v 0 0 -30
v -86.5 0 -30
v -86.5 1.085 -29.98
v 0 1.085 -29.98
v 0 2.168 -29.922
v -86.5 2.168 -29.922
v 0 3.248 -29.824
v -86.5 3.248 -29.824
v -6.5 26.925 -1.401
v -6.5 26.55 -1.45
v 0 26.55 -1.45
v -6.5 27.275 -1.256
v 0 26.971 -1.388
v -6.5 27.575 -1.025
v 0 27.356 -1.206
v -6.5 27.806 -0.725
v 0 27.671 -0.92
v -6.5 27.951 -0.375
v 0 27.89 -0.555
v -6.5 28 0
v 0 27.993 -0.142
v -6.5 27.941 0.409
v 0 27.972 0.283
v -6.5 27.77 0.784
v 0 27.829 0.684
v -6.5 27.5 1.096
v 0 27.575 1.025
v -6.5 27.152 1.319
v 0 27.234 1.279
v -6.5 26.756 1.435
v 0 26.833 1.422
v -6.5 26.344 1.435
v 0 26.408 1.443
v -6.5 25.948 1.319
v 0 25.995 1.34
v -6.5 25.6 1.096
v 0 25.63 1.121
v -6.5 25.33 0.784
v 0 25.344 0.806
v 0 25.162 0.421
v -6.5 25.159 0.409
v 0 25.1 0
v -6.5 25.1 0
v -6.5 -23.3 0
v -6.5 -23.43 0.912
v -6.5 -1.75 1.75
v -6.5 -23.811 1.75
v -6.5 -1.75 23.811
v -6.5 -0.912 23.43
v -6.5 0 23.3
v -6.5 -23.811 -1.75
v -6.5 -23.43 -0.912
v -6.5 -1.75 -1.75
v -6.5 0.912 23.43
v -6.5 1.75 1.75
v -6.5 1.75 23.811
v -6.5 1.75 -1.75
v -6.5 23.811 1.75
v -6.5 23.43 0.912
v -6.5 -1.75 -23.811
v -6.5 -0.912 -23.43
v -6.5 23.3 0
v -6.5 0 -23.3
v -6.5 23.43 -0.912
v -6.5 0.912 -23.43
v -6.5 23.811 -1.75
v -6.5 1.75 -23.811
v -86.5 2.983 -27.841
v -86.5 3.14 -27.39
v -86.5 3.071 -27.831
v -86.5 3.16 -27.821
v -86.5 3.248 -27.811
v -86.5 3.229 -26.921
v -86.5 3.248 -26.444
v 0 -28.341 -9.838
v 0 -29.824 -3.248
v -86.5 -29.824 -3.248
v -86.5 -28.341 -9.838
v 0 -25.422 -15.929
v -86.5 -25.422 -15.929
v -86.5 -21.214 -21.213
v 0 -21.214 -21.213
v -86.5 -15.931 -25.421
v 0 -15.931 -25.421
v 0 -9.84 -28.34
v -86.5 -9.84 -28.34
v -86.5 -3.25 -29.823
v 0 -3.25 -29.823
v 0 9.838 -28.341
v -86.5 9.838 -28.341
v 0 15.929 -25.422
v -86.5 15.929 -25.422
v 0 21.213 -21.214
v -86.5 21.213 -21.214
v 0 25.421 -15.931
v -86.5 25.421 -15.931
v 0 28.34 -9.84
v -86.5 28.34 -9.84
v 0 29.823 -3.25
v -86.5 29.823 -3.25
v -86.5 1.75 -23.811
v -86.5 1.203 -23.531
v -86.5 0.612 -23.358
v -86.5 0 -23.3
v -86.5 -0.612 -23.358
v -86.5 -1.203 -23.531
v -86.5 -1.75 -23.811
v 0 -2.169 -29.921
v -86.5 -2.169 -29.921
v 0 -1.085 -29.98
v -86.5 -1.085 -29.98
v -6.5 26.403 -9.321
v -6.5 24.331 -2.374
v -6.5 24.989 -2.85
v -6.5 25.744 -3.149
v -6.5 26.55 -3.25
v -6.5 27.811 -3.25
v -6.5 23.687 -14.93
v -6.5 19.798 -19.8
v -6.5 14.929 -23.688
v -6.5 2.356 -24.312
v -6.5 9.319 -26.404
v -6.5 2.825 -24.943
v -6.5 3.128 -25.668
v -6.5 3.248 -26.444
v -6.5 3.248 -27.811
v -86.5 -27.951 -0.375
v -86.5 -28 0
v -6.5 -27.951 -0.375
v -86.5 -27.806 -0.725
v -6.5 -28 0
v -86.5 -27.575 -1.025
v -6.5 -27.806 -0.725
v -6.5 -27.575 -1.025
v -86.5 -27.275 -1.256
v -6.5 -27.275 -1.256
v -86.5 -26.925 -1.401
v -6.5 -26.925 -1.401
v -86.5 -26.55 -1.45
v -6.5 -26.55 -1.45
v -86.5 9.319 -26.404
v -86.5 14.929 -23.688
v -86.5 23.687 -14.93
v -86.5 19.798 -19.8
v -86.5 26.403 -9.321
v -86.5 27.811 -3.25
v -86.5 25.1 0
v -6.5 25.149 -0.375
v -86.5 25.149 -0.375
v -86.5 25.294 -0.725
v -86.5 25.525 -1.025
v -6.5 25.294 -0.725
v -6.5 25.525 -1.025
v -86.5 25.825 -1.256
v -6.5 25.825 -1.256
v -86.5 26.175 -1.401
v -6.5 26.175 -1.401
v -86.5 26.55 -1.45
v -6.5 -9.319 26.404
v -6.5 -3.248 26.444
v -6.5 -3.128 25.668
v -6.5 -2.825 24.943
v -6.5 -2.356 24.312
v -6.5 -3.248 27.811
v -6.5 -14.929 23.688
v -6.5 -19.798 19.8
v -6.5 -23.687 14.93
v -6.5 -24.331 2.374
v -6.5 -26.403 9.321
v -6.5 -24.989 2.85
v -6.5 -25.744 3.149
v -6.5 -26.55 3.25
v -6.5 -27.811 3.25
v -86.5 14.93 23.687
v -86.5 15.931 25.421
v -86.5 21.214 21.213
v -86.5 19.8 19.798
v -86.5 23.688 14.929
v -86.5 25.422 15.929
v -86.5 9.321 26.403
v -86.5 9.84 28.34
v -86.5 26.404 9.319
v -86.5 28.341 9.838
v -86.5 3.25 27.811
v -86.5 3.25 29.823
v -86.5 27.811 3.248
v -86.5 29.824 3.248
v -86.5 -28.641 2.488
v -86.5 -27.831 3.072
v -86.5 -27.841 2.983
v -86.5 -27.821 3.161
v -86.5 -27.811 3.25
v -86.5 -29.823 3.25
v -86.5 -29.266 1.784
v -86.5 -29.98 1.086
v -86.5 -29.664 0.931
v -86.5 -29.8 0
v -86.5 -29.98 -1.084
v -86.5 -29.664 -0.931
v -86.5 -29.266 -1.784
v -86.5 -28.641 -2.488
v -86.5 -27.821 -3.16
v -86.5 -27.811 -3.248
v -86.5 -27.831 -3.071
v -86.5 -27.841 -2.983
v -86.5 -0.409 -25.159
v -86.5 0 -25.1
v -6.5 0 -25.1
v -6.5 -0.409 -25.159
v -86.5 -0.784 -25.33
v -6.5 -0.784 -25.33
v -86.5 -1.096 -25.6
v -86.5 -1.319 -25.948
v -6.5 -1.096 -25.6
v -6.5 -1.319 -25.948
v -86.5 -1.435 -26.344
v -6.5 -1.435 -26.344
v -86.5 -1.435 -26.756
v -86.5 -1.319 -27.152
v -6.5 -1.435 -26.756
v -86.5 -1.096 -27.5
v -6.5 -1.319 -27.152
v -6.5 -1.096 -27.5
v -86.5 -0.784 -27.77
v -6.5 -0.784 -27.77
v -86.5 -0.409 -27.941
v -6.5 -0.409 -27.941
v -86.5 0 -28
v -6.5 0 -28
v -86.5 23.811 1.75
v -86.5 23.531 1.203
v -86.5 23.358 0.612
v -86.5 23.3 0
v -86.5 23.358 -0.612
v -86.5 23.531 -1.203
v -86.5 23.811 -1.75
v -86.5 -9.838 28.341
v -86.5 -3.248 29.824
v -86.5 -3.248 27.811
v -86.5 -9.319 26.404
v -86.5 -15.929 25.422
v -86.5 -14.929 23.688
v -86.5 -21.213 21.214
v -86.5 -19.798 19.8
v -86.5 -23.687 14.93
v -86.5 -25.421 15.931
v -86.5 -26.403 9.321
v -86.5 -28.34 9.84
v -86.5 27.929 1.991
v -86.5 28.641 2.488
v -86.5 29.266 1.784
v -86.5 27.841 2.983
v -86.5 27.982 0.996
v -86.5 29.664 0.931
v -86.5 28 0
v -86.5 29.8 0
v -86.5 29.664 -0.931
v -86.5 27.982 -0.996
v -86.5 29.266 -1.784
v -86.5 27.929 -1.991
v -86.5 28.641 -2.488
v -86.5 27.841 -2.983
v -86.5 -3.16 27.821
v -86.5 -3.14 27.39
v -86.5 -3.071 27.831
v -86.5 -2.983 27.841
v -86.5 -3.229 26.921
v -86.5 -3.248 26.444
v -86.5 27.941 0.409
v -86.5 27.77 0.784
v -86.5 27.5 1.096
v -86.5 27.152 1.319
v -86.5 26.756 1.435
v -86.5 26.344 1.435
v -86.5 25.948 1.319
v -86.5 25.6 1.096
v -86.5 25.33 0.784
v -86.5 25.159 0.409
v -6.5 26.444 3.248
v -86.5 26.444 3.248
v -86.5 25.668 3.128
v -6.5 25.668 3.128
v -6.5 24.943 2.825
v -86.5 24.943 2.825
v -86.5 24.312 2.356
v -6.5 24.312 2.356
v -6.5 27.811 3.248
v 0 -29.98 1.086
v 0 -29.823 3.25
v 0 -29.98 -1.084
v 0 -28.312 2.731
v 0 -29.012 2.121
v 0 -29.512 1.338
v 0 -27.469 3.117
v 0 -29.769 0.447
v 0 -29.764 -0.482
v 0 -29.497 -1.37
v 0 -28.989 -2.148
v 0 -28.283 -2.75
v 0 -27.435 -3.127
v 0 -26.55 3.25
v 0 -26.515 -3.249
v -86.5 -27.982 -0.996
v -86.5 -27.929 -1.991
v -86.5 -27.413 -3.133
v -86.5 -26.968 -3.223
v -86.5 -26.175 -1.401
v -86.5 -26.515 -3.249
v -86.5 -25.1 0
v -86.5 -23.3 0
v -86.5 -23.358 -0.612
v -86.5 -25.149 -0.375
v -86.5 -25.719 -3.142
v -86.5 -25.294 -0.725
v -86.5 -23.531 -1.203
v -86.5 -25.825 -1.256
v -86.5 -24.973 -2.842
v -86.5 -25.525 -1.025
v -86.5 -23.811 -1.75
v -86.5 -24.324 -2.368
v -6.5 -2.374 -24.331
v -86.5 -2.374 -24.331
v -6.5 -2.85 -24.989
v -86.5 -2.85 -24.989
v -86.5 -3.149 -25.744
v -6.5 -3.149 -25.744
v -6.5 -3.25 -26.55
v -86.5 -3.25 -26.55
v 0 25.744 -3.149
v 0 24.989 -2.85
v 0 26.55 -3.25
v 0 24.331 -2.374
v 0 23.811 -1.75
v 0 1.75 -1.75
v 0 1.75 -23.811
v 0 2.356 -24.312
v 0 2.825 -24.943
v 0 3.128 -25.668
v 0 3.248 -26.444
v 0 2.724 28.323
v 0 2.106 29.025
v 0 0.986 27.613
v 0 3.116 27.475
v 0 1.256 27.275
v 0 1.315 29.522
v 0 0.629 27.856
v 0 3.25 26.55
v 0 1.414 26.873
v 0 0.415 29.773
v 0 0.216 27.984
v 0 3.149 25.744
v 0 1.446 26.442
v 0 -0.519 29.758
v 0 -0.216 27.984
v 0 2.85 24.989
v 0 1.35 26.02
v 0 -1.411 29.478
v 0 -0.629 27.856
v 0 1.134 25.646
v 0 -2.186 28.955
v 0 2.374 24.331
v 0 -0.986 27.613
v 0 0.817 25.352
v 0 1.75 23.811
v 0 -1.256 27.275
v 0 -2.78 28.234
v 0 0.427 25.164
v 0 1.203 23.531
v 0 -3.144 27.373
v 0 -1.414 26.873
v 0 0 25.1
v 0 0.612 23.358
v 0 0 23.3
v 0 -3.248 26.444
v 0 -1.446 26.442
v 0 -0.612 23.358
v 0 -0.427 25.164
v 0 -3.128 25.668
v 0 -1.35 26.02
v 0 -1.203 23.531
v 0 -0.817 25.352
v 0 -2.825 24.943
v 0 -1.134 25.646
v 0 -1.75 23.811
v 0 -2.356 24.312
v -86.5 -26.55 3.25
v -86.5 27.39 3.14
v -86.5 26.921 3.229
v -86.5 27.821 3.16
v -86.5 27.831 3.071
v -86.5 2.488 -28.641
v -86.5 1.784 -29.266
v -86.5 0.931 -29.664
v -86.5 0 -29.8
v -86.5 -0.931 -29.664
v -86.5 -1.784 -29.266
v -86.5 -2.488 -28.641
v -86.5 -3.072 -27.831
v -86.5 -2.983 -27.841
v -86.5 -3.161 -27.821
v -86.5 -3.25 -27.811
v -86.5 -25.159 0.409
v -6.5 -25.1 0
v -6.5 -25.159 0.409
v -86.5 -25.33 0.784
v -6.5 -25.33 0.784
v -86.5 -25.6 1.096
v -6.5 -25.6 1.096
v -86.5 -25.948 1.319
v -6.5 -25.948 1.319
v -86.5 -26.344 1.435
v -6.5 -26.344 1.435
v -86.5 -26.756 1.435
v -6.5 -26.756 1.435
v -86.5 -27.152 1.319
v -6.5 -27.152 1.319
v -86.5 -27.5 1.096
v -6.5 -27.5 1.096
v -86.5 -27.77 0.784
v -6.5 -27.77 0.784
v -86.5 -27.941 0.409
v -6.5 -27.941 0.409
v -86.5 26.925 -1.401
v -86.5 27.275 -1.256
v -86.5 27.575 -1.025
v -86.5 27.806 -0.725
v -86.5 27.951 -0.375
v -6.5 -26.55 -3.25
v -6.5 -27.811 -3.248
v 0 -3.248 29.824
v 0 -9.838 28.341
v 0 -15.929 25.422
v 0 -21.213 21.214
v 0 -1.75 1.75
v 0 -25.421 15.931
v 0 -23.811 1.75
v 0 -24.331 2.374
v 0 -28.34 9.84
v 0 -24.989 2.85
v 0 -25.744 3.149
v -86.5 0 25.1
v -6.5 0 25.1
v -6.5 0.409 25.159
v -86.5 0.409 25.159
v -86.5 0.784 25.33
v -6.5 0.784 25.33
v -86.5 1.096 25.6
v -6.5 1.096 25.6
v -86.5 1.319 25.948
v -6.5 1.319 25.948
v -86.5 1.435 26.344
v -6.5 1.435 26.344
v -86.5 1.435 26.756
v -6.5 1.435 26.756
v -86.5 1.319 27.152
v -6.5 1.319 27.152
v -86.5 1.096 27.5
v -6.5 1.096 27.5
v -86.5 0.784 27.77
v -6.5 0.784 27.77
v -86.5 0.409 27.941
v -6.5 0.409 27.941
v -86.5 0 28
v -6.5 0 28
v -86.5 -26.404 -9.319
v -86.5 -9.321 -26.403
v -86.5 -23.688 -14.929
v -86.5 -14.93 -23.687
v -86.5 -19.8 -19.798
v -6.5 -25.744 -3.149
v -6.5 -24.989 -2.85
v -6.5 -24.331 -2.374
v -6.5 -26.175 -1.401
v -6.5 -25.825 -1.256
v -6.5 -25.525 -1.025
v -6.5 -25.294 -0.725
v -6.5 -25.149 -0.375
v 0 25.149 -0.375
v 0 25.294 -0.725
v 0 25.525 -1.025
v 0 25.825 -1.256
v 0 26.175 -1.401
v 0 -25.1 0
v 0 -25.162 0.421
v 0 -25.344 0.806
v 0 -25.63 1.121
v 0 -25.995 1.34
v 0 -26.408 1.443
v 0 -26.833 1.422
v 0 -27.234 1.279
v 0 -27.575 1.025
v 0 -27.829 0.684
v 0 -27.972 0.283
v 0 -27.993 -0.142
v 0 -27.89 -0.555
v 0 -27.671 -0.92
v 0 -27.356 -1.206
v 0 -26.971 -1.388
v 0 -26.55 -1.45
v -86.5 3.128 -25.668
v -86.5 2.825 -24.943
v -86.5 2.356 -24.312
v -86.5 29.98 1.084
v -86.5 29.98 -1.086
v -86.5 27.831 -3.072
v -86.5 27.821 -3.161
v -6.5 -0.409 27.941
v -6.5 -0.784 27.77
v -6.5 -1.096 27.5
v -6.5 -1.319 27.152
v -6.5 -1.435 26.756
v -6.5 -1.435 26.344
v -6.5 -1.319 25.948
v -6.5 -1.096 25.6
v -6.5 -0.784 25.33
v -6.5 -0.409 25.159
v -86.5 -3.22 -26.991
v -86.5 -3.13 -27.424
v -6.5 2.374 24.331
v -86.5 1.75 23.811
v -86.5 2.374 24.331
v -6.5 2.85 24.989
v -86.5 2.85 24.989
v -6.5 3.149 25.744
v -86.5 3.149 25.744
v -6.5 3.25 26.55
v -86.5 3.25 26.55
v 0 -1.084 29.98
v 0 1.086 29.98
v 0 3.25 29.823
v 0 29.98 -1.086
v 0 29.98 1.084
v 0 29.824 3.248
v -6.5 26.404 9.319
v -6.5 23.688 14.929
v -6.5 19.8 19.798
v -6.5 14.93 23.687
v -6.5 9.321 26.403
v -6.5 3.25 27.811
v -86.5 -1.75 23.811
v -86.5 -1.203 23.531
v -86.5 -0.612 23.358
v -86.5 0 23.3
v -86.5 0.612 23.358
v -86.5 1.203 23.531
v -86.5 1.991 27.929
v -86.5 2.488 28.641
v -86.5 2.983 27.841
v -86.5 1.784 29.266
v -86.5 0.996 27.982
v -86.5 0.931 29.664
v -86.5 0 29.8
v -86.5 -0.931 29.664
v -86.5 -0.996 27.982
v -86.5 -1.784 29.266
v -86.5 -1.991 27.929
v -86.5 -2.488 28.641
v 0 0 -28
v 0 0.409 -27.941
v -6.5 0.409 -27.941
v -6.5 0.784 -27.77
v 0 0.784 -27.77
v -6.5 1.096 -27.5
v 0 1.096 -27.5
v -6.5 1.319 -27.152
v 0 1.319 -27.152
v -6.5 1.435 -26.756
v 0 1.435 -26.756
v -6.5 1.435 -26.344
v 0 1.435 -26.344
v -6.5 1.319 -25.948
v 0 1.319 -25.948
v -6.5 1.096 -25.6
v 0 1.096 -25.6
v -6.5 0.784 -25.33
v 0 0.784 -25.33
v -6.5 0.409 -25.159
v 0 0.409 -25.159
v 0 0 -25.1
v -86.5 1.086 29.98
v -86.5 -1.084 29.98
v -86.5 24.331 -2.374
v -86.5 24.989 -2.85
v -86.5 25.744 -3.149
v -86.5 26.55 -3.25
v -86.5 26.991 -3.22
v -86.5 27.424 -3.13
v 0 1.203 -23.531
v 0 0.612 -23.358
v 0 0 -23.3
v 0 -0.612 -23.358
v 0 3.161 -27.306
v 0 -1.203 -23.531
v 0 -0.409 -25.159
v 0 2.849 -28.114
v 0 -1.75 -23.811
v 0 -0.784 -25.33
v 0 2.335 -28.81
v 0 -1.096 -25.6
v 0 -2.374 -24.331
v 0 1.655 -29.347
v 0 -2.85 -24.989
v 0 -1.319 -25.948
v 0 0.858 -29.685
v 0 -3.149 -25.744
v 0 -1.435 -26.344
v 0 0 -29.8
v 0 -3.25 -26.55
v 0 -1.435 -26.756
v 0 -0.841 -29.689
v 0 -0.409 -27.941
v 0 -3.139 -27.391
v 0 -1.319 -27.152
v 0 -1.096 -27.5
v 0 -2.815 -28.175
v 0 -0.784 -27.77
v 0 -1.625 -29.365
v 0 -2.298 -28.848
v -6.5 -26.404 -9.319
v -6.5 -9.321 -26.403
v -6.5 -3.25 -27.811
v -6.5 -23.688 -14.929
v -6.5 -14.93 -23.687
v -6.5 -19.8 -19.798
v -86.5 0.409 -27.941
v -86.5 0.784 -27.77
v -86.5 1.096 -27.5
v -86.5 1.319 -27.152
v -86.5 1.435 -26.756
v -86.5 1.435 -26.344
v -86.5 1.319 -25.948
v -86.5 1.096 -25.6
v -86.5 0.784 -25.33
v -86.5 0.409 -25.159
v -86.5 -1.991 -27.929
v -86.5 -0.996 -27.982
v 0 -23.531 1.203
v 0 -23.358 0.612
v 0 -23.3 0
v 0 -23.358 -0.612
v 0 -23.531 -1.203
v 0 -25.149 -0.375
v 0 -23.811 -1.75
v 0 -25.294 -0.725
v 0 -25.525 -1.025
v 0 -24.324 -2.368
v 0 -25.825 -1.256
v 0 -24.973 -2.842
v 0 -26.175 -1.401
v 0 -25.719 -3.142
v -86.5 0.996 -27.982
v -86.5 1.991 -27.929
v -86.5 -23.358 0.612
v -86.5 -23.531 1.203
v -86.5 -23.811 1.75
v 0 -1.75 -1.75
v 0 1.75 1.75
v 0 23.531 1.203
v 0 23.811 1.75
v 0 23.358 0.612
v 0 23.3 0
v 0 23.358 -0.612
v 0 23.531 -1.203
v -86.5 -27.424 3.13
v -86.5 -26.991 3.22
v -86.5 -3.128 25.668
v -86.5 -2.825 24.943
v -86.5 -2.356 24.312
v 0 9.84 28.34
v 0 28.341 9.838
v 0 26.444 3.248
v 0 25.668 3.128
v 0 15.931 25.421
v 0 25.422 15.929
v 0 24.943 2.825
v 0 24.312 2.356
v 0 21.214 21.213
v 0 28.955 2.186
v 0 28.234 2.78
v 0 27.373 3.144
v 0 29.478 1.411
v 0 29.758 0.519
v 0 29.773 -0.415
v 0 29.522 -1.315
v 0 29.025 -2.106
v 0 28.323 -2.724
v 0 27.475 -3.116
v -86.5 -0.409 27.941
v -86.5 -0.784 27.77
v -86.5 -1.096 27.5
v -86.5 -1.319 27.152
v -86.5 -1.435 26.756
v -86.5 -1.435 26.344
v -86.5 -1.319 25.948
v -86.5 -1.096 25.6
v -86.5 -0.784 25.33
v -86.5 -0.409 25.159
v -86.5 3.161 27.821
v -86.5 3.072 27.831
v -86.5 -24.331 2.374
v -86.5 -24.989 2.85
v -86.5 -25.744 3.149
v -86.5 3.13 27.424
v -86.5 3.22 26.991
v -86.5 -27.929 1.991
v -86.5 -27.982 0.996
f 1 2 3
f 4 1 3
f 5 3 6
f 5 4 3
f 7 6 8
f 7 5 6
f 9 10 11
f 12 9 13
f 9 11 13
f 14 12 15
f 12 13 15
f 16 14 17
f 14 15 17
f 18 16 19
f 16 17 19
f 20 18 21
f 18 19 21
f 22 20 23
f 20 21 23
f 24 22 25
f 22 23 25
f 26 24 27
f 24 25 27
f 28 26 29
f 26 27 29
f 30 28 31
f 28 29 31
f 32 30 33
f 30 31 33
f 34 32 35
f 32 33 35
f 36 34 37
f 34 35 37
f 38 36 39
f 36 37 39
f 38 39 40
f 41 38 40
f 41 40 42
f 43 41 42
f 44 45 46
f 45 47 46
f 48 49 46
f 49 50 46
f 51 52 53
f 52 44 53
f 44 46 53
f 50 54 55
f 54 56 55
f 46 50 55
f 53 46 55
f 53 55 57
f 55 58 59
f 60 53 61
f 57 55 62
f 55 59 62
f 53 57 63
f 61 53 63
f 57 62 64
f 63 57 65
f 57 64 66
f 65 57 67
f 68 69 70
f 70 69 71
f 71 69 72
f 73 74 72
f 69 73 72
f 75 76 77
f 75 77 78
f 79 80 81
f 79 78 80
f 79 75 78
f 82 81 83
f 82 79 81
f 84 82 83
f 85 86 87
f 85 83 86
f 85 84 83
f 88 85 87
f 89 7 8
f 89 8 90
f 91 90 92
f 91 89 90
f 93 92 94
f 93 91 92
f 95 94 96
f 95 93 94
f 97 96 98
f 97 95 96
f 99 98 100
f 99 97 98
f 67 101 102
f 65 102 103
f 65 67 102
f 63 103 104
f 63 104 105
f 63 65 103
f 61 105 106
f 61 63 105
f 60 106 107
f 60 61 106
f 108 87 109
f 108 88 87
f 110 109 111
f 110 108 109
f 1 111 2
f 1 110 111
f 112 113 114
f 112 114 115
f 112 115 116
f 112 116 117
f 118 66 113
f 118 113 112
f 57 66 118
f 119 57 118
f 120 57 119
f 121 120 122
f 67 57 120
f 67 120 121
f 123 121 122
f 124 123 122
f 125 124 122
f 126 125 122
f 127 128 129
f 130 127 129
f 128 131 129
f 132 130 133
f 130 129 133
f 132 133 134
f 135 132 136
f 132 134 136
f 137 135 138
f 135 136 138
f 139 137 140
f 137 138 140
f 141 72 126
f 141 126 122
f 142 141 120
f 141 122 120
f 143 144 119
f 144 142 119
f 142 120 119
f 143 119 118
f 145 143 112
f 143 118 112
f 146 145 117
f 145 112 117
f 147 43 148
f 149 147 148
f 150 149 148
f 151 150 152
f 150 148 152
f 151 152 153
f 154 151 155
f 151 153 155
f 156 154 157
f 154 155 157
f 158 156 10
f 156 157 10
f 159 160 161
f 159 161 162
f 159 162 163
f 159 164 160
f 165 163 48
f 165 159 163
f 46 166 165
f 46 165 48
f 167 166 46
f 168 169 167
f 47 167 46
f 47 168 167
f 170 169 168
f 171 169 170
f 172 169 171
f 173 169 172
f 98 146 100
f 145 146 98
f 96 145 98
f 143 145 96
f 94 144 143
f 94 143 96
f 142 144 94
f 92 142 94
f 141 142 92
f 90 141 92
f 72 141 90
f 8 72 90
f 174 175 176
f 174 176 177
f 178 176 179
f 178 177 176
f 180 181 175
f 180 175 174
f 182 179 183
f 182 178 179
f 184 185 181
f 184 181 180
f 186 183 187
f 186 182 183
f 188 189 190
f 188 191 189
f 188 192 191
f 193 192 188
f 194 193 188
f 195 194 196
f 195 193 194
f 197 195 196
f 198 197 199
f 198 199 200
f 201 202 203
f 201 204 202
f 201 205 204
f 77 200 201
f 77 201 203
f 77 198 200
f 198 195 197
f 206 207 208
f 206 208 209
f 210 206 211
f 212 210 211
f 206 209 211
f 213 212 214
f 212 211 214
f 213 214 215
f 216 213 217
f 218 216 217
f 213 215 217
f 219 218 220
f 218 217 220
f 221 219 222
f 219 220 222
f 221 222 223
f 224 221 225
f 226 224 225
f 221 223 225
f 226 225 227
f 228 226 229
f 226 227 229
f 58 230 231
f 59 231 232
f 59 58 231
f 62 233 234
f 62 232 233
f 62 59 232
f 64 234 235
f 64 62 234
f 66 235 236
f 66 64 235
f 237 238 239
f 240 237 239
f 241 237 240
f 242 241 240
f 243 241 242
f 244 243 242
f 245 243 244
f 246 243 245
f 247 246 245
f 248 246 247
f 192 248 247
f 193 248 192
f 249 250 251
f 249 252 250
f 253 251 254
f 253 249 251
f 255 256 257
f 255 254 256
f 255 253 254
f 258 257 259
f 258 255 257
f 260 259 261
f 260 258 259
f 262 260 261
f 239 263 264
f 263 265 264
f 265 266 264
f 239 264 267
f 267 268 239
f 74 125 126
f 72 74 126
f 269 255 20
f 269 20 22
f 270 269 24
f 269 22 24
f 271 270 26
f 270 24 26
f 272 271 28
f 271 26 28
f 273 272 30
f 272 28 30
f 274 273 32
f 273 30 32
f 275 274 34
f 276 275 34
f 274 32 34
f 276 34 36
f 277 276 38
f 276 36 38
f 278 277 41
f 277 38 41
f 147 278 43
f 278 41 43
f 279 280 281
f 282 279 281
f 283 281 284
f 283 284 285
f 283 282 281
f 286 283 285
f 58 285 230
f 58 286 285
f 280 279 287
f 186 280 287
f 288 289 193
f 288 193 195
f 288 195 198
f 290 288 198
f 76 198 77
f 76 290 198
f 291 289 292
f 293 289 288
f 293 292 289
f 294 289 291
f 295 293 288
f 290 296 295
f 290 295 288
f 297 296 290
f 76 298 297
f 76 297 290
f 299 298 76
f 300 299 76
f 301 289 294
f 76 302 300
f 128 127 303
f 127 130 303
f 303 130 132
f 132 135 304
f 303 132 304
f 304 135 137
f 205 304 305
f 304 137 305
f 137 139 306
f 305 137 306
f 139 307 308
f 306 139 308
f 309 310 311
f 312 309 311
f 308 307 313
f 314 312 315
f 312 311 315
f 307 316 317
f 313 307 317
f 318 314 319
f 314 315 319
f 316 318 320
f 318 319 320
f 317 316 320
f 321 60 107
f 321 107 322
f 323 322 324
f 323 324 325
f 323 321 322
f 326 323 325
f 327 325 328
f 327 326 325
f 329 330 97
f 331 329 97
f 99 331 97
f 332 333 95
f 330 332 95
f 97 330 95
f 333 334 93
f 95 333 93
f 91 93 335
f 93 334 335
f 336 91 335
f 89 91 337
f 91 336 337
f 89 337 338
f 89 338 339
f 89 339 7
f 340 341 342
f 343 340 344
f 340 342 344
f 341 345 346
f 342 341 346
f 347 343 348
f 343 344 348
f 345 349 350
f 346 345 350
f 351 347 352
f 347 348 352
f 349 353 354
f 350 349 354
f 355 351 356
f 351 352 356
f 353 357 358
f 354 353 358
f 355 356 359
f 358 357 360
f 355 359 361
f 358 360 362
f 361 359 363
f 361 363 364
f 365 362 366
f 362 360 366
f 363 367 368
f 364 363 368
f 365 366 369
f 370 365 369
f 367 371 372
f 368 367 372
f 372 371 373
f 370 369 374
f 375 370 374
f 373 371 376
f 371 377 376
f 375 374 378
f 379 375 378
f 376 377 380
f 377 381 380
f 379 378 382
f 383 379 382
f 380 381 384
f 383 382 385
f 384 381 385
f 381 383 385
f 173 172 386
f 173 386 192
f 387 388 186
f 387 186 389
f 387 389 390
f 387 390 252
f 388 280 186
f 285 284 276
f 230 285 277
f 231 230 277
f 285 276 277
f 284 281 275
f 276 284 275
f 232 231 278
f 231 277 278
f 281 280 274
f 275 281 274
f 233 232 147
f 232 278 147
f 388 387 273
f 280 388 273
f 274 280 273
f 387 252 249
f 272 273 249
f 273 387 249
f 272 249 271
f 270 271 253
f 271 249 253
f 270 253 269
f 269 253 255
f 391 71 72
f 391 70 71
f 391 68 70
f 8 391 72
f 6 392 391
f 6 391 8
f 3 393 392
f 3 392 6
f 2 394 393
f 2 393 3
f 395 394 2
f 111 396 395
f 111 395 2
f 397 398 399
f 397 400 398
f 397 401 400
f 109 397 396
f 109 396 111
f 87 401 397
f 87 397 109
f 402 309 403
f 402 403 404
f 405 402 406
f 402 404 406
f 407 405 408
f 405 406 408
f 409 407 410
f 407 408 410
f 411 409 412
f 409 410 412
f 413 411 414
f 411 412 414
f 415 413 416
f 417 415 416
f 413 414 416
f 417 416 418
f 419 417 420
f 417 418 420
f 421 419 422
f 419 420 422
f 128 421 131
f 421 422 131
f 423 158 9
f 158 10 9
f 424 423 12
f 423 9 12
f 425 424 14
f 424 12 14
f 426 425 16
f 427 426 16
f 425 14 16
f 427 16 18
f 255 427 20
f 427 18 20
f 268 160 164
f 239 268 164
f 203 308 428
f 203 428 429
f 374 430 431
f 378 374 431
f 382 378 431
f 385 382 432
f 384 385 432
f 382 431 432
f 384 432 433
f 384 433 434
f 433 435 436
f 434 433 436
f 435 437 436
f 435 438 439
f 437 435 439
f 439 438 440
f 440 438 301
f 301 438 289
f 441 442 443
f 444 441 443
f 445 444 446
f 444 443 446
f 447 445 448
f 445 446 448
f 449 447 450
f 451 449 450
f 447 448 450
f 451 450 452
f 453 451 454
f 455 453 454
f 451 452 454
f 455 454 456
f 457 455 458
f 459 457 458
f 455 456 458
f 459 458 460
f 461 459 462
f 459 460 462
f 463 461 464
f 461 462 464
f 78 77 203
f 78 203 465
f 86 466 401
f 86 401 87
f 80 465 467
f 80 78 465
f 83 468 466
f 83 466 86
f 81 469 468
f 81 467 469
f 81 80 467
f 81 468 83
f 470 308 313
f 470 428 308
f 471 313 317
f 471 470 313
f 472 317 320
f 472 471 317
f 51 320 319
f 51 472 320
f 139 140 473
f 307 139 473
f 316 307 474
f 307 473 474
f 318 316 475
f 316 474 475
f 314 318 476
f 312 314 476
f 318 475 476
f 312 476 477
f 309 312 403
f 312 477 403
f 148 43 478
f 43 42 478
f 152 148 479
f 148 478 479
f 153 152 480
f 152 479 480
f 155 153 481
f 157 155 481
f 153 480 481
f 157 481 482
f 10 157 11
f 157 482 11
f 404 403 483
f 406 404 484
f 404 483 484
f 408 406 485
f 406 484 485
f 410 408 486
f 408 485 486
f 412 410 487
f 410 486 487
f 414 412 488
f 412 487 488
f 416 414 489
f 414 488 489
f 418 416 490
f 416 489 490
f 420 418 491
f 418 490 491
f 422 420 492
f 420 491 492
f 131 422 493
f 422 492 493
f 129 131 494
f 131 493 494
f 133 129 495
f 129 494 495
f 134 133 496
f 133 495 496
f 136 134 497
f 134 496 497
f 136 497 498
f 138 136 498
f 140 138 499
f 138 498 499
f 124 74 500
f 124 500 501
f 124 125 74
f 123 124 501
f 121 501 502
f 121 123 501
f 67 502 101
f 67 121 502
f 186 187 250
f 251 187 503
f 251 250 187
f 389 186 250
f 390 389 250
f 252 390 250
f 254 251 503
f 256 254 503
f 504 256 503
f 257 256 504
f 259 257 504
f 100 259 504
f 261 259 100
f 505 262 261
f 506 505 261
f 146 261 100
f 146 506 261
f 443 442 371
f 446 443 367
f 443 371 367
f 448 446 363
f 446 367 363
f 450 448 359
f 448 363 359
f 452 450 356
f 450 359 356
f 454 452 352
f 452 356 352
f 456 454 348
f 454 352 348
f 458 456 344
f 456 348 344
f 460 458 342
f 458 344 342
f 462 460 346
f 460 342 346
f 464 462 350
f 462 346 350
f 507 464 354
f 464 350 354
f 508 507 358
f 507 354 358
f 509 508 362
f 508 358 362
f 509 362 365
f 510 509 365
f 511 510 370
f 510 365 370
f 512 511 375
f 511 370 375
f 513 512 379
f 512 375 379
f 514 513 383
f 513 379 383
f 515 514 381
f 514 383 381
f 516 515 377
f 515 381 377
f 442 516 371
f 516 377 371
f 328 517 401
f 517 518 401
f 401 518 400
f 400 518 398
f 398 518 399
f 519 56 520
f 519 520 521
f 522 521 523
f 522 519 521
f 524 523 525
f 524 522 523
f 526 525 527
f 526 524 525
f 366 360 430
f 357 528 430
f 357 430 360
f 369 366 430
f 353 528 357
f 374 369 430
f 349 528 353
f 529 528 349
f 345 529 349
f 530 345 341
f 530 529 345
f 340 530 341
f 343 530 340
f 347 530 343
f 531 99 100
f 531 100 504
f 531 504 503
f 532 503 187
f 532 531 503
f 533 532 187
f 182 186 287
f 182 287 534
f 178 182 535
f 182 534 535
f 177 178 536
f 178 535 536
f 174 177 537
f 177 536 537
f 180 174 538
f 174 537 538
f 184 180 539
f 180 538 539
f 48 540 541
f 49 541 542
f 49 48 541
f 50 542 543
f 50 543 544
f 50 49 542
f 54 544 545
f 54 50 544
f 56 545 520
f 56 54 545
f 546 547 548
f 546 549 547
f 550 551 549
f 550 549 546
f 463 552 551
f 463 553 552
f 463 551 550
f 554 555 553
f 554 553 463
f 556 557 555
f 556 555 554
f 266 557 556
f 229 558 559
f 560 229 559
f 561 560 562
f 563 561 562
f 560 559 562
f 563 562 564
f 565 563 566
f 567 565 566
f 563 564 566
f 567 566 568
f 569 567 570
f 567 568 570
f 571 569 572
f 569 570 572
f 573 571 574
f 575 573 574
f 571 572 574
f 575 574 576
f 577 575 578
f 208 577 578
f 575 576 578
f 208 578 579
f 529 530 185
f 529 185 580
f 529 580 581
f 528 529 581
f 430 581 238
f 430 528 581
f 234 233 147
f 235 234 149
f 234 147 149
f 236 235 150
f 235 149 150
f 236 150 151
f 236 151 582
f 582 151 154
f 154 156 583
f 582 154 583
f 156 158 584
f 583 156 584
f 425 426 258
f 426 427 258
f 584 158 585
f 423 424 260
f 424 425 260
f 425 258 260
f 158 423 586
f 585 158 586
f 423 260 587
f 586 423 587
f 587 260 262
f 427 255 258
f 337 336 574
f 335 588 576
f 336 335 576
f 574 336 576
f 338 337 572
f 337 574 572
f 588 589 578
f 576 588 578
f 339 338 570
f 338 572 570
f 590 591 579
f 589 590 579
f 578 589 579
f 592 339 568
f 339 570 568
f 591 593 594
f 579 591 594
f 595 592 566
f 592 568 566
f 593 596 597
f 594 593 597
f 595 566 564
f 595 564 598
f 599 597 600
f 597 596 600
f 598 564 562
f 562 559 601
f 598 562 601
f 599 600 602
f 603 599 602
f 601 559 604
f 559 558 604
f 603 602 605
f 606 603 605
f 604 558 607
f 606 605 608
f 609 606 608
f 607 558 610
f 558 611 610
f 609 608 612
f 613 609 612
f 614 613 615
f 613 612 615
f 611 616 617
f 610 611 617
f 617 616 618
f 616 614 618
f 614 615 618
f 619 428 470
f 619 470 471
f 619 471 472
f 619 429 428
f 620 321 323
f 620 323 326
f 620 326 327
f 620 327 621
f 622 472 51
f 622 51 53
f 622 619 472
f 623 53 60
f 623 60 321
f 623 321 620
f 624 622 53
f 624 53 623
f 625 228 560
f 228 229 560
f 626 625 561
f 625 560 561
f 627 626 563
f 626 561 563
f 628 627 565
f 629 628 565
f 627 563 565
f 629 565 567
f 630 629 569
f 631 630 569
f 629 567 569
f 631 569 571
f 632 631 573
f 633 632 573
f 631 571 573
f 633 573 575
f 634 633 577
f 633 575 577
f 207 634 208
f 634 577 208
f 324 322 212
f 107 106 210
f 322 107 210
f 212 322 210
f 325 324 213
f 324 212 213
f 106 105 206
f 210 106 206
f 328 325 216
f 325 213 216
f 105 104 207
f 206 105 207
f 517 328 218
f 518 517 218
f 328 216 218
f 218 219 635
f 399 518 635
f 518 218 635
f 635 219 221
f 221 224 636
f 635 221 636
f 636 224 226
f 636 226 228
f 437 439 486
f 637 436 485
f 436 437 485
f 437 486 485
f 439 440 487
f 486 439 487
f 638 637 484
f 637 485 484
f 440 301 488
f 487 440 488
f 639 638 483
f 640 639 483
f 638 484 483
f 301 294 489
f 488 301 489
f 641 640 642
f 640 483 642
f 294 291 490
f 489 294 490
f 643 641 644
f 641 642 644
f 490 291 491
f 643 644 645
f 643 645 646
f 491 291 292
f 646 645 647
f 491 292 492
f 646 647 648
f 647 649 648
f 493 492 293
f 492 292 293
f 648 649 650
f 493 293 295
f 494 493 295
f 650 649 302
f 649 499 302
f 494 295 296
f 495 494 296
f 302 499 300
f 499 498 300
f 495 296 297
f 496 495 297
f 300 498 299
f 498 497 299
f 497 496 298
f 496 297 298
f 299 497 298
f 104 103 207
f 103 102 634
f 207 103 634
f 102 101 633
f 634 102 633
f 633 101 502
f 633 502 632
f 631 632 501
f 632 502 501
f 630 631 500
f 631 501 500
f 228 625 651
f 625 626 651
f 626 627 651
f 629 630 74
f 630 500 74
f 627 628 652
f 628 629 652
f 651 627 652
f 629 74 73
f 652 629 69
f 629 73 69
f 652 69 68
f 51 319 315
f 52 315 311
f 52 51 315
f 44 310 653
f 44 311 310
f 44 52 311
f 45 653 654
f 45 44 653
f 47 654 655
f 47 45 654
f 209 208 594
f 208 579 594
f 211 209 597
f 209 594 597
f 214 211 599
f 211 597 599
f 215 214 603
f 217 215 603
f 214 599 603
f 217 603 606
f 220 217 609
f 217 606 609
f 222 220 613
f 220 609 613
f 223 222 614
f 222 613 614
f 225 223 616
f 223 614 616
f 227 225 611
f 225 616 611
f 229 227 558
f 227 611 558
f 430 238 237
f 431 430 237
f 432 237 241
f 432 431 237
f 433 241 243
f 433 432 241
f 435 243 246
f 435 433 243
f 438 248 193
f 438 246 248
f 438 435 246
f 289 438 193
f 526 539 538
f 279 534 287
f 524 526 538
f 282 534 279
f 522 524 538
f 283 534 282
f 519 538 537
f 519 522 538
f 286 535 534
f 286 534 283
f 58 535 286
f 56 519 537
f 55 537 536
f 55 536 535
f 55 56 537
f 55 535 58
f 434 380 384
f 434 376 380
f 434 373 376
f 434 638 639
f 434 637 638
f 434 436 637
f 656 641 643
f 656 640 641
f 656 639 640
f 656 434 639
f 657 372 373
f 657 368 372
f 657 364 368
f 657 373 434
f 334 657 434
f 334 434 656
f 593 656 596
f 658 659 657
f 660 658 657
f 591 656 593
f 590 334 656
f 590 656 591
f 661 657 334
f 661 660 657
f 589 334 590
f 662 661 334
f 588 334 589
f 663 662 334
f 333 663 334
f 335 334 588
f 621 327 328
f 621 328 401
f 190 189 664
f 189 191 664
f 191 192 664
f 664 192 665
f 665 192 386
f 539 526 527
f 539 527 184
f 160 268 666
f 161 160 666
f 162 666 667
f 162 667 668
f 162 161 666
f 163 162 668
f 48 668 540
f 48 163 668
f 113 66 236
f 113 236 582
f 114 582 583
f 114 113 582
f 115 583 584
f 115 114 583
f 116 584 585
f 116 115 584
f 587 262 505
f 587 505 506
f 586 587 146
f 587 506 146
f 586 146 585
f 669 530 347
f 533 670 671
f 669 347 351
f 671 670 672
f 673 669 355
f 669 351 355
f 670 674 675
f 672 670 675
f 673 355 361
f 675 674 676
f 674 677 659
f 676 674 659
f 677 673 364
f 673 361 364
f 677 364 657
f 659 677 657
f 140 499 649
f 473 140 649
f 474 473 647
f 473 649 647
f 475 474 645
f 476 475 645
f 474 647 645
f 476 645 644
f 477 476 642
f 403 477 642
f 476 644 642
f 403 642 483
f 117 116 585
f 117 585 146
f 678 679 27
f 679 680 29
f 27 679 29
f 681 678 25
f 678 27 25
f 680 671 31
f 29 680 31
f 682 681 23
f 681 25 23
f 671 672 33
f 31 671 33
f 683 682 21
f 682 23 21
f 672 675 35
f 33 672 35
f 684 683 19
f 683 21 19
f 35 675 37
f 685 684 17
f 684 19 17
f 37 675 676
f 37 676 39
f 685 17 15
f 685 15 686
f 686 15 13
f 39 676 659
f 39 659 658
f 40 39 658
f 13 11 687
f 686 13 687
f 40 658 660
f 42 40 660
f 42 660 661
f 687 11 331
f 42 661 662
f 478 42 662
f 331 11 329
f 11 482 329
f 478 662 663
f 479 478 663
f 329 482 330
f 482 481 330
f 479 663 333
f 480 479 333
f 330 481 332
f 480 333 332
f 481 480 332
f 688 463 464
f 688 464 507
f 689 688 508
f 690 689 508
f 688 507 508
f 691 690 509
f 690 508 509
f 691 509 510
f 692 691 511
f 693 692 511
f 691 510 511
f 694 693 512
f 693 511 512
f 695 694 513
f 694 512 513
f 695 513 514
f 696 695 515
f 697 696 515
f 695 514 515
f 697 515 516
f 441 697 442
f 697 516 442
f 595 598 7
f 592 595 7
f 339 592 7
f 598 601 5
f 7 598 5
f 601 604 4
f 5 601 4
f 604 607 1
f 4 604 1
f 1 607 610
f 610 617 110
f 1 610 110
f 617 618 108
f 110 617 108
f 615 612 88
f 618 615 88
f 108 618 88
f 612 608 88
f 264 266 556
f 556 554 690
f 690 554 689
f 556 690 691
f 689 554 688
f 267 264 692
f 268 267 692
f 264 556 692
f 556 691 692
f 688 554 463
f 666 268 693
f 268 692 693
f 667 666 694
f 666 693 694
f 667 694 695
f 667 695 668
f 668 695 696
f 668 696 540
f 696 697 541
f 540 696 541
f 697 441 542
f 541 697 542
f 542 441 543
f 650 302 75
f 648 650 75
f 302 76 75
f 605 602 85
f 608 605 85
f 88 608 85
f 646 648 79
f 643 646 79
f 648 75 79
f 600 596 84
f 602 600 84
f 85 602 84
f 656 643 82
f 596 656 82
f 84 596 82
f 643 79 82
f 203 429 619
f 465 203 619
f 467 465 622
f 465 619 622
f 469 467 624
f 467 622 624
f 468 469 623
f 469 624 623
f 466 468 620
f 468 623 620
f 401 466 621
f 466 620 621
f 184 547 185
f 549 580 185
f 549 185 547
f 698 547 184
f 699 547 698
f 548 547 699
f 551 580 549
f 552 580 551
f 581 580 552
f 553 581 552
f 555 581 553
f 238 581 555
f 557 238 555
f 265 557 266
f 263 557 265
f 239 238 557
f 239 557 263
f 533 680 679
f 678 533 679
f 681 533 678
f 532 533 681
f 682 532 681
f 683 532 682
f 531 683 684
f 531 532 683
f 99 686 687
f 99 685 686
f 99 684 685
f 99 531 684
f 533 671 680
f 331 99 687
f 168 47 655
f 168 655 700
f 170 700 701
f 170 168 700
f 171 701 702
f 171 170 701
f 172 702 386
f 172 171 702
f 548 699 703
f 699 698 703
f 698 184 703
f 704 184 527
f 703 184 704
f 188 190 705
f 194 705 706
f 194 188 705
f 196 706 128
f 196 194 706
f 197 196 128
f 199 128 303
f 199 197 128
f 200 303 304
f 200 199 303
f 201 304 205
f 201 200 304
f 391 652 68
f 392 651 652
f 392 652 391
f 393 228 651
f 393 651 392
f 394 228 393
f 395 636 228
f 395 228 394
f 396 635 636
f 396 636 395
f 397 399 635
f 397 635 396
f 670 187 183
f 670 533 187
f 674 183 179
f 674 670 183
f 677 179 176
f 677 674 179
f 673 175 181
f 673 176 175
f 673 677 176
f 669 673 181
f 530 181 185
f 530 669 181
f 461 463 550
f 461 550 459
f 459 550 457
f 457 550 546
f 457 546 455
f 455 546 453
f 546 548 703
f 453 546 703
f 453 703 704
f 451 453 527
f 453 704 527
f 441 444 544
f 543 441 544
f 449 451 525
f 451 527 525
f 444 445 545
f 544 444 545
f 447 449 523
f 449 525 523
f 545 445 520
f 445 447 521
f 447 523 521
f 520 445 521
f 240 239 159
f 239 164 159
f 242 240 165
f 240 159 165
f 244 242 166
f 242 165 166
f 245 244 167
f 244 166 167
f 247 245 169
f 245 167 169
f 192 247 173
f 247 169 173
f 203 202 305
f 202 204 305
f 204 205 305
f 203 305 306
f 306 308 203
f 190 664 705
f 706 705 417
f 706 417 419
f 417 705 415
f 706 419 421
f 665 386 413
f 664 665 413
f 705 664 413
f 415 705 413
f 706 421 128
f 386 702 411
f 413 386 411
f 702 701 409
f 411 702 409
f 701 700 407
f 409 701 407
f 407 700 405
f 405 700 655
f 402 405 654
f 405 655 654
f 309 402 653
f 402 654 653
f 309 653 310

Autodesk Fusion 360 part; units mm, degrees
sketch "Sketch1" plane through (0, 0, 0) normal (0, 1, 0) x (1, 0, 0)
  line L0 (0, 0) -> (-86.5, 0)
  line L1 (-86.5, 0) -> (-86.5, 30)
  line L2 (-86.5, 30) -> (0, 30)
  line L3 (0, 30) -> (0, 0)
  line L4 (0, 0) -> (-6.5, 0)
  line L5 (-6.5, 0) -> (-6.5, 30)
  line L6 (-6.5, 30) -> (0, 30)
  line L7 (0, 30) -> (0, 0)
  line L8 (0, 0) -> (-86.5, 0)
  line L9 (-86.5, 0) -> (-86.5, 28)
  line L10 (-86.5, 28) -> (0, 28)
  line L11 (0, 28) -> (0, 0)
  line L12 (-6.5, 0) -> (-86.5, 0)
  line L13 (-46.5, 0) -> (-6.5, 0)
  line L14 (-86.5, 0) -> (-83.5, 0)
  dimension "d1" = 86.5
  dimension "d2" = 30
  dimension "d3" = 6.5
  dimension "d4" = 30
  dimension "d5" = 86.5
  dimension "d6" = 28
revolve "Revolve1" add sketch "Sketch1" angle 360 about axis through (-6.5, 0, 0) along (-1, 0, 0) contours L0 L3 L4 L5 L7 L8 L10 L11 | L2 L3 L5 L6 L7 L10 | L1 L2 L5 L10
sketch "Sketch2" plane through (0, 0, 0) normal (1, 0, 0) x (0, 0, -1)
  circle A0 centre (0, 0) radius 30
  line L0 (0, 0) -> (0, 26.55)
  circle A1 centre (0, 26.55) radius 1.25
  circle A2 centre (0, 26.55) radius 1.45
  circle A3 centre (0, 26.55) radius 3.25
  line L1 (-3.2483, 26.4444) -> (-3.2483, 29.8236)
  line L2 (3.25, 23.9996) -> (3.25, 29.8234)
  line L3 (0, 0) -> (1.75, 0)
  line L4 (1.75, 0) -> (1.75, 23.8114)
  line L5 (-1.75, 0) -> (-1.75, 23.8114)
  line L6 (0, 0) -> (-1.75, 0)
  line L7 (-26.4444, -3.2483) -> (-29.8236, -3.2483)
  line L8 (-23.9996, 3.25) -> (-29.8234, 3.25)
  circle A4 centre (-26.55, 0) radius 3.25
  circle A5 centre (-26.55, 0) radius 1.45
  circle A6 centre (-26.55, 0) radius 1.25
  line L9 (0, 0) -> (-26.55, 0)
  line L10 (0, -1.75) -> (-23.8114, -1.75)
  line L11 (0, 1.75) -> (-23.8114, 1.75)
  line L12 (0, 0) -> (0, -1.75)
  line L13 (0, 0) -> (0, 1.75)
  line L14 (3.2483, -26.4444) -> (3.2483, -29.8236)
  line L15 (-3.25, -23.9996) -> (-3.25, -29.8234)
  circle A7 centre (0, -26.55) radius 3.25
  circle A8 centre (0, -26.55) radius 1.45
  circle A9 centre (0, -26.55) radius 1.25
  line L16 (0, 0) -> (0, -26.55)
  line L17 (1.75, 0) -> (1.75, -23.8114)
  line L18 (-1.75, 0) -> (-1.75, -23.8114)
  line L19 (0, 0) -> (1.75, 0)
  line L20 (0, 0) -> (-1.75, 0)
  line L21 (26.4444, 3.2483) -> (29.8236, 3.2483)
  line L22 (23.9996, -3.25) -> (29.8234, -3.25)
  circle A10 centre (26.55, 0) radius 3.25
  circle A11 centre (26.55, 0) radius 1.45
  circle A12 centre (26.55, 0) radius 1.25
  line L23 (0, 0) -> (26.55, 0)
  line L24 (0, 1.75) -> (23.8114, 1.75)
  line L25 (0, -1.75) -> (23.8114, -1.75)
  line L26 (0, 0) -> (0, 1.75)
  line L27 (0, 0) -> (0, -1.75)
  point P0 (-4, 24)
  point P1 (3.25, 23.9996)
  dimension "d10" = 26.55
  dimension "d11" = 2.5
  dimension "d12" = 0.2
  dimension "d13" = 6.5
  dimension "d14" = 1.75
  dimension "d16" = 360
extrude "Extrude1" cut sketch "Sketch2" against normal blind 86.5 contours A12 | A11 | A1 | A2 | A9 | A8 | A6 | A5
extrude "Extrude2" add sketch "Sketch2" against normal blind 86.5 contours A10 | A0 L21 L22 A10 | A3 | A0 A3 L1 L2 | A0 L14 L15 A7 | L4 A10 L23 L24 | A0 L7 L8 A4 | L14 A7 | L17 A10 L23 L25 | L0 A3 L4 L24 | L0 L3 L4 L13 L19 L23 L24 L26 | L3 L12 L16 L17 L19 L23 L25 L27 | A7 L16 L17 L25 | A4 | L0 A3 L5 L11 | L0 L5 L6 L9 L11 L13 L20 L26 | L10 A7 L16 L18 | L6 L9 L10 L12 L16 L18 L20 L27 | L5 A4 L9 L11 | A4 L9 L10 L18
extrude "Extrude3" cut sketch "Sketch2" against normal blind 86.5 contours L4 A10 L23 L24 | L17 A10 L23 L25 | L0 A3 L4 L24 | L0 L3 L4 L13 L19 L23 L24 L26 | L3 L12 L16 L17 L19 L23 L25 L27 | A7 L16 L17 L25 | L0 A3 L5 L11 | L0 L5 L6 L9 L11 L13 L20 L26 | L10 A7 L16 L18 | L6 L9 L10 L12 L16 L18 L20 L27 | L5 A4 L9 L11 | A4 L9 L10 L18
extrude "Extrude4" add sketch "Sketch2" against normal blind 6.5 contours L4 A10 L23 L24 | L17 A10 L23 L25 | L0 A3 L4 L24 | L0 L3 L4 L13 L19 L23 L24 L26 | L3 L12 L16 L17 L19 L23 L25 L27 | A7 L16 L17 L25 | L0 A3 L5 L11 | L0 L5 L6 L9 L11 L13 L20 L26 | L10 A7 L16 L18 | L6 L9 L10 L12 L16 L18 L20 L27 | L5 A4 L9 L11 | A4 L9 L10 L18
